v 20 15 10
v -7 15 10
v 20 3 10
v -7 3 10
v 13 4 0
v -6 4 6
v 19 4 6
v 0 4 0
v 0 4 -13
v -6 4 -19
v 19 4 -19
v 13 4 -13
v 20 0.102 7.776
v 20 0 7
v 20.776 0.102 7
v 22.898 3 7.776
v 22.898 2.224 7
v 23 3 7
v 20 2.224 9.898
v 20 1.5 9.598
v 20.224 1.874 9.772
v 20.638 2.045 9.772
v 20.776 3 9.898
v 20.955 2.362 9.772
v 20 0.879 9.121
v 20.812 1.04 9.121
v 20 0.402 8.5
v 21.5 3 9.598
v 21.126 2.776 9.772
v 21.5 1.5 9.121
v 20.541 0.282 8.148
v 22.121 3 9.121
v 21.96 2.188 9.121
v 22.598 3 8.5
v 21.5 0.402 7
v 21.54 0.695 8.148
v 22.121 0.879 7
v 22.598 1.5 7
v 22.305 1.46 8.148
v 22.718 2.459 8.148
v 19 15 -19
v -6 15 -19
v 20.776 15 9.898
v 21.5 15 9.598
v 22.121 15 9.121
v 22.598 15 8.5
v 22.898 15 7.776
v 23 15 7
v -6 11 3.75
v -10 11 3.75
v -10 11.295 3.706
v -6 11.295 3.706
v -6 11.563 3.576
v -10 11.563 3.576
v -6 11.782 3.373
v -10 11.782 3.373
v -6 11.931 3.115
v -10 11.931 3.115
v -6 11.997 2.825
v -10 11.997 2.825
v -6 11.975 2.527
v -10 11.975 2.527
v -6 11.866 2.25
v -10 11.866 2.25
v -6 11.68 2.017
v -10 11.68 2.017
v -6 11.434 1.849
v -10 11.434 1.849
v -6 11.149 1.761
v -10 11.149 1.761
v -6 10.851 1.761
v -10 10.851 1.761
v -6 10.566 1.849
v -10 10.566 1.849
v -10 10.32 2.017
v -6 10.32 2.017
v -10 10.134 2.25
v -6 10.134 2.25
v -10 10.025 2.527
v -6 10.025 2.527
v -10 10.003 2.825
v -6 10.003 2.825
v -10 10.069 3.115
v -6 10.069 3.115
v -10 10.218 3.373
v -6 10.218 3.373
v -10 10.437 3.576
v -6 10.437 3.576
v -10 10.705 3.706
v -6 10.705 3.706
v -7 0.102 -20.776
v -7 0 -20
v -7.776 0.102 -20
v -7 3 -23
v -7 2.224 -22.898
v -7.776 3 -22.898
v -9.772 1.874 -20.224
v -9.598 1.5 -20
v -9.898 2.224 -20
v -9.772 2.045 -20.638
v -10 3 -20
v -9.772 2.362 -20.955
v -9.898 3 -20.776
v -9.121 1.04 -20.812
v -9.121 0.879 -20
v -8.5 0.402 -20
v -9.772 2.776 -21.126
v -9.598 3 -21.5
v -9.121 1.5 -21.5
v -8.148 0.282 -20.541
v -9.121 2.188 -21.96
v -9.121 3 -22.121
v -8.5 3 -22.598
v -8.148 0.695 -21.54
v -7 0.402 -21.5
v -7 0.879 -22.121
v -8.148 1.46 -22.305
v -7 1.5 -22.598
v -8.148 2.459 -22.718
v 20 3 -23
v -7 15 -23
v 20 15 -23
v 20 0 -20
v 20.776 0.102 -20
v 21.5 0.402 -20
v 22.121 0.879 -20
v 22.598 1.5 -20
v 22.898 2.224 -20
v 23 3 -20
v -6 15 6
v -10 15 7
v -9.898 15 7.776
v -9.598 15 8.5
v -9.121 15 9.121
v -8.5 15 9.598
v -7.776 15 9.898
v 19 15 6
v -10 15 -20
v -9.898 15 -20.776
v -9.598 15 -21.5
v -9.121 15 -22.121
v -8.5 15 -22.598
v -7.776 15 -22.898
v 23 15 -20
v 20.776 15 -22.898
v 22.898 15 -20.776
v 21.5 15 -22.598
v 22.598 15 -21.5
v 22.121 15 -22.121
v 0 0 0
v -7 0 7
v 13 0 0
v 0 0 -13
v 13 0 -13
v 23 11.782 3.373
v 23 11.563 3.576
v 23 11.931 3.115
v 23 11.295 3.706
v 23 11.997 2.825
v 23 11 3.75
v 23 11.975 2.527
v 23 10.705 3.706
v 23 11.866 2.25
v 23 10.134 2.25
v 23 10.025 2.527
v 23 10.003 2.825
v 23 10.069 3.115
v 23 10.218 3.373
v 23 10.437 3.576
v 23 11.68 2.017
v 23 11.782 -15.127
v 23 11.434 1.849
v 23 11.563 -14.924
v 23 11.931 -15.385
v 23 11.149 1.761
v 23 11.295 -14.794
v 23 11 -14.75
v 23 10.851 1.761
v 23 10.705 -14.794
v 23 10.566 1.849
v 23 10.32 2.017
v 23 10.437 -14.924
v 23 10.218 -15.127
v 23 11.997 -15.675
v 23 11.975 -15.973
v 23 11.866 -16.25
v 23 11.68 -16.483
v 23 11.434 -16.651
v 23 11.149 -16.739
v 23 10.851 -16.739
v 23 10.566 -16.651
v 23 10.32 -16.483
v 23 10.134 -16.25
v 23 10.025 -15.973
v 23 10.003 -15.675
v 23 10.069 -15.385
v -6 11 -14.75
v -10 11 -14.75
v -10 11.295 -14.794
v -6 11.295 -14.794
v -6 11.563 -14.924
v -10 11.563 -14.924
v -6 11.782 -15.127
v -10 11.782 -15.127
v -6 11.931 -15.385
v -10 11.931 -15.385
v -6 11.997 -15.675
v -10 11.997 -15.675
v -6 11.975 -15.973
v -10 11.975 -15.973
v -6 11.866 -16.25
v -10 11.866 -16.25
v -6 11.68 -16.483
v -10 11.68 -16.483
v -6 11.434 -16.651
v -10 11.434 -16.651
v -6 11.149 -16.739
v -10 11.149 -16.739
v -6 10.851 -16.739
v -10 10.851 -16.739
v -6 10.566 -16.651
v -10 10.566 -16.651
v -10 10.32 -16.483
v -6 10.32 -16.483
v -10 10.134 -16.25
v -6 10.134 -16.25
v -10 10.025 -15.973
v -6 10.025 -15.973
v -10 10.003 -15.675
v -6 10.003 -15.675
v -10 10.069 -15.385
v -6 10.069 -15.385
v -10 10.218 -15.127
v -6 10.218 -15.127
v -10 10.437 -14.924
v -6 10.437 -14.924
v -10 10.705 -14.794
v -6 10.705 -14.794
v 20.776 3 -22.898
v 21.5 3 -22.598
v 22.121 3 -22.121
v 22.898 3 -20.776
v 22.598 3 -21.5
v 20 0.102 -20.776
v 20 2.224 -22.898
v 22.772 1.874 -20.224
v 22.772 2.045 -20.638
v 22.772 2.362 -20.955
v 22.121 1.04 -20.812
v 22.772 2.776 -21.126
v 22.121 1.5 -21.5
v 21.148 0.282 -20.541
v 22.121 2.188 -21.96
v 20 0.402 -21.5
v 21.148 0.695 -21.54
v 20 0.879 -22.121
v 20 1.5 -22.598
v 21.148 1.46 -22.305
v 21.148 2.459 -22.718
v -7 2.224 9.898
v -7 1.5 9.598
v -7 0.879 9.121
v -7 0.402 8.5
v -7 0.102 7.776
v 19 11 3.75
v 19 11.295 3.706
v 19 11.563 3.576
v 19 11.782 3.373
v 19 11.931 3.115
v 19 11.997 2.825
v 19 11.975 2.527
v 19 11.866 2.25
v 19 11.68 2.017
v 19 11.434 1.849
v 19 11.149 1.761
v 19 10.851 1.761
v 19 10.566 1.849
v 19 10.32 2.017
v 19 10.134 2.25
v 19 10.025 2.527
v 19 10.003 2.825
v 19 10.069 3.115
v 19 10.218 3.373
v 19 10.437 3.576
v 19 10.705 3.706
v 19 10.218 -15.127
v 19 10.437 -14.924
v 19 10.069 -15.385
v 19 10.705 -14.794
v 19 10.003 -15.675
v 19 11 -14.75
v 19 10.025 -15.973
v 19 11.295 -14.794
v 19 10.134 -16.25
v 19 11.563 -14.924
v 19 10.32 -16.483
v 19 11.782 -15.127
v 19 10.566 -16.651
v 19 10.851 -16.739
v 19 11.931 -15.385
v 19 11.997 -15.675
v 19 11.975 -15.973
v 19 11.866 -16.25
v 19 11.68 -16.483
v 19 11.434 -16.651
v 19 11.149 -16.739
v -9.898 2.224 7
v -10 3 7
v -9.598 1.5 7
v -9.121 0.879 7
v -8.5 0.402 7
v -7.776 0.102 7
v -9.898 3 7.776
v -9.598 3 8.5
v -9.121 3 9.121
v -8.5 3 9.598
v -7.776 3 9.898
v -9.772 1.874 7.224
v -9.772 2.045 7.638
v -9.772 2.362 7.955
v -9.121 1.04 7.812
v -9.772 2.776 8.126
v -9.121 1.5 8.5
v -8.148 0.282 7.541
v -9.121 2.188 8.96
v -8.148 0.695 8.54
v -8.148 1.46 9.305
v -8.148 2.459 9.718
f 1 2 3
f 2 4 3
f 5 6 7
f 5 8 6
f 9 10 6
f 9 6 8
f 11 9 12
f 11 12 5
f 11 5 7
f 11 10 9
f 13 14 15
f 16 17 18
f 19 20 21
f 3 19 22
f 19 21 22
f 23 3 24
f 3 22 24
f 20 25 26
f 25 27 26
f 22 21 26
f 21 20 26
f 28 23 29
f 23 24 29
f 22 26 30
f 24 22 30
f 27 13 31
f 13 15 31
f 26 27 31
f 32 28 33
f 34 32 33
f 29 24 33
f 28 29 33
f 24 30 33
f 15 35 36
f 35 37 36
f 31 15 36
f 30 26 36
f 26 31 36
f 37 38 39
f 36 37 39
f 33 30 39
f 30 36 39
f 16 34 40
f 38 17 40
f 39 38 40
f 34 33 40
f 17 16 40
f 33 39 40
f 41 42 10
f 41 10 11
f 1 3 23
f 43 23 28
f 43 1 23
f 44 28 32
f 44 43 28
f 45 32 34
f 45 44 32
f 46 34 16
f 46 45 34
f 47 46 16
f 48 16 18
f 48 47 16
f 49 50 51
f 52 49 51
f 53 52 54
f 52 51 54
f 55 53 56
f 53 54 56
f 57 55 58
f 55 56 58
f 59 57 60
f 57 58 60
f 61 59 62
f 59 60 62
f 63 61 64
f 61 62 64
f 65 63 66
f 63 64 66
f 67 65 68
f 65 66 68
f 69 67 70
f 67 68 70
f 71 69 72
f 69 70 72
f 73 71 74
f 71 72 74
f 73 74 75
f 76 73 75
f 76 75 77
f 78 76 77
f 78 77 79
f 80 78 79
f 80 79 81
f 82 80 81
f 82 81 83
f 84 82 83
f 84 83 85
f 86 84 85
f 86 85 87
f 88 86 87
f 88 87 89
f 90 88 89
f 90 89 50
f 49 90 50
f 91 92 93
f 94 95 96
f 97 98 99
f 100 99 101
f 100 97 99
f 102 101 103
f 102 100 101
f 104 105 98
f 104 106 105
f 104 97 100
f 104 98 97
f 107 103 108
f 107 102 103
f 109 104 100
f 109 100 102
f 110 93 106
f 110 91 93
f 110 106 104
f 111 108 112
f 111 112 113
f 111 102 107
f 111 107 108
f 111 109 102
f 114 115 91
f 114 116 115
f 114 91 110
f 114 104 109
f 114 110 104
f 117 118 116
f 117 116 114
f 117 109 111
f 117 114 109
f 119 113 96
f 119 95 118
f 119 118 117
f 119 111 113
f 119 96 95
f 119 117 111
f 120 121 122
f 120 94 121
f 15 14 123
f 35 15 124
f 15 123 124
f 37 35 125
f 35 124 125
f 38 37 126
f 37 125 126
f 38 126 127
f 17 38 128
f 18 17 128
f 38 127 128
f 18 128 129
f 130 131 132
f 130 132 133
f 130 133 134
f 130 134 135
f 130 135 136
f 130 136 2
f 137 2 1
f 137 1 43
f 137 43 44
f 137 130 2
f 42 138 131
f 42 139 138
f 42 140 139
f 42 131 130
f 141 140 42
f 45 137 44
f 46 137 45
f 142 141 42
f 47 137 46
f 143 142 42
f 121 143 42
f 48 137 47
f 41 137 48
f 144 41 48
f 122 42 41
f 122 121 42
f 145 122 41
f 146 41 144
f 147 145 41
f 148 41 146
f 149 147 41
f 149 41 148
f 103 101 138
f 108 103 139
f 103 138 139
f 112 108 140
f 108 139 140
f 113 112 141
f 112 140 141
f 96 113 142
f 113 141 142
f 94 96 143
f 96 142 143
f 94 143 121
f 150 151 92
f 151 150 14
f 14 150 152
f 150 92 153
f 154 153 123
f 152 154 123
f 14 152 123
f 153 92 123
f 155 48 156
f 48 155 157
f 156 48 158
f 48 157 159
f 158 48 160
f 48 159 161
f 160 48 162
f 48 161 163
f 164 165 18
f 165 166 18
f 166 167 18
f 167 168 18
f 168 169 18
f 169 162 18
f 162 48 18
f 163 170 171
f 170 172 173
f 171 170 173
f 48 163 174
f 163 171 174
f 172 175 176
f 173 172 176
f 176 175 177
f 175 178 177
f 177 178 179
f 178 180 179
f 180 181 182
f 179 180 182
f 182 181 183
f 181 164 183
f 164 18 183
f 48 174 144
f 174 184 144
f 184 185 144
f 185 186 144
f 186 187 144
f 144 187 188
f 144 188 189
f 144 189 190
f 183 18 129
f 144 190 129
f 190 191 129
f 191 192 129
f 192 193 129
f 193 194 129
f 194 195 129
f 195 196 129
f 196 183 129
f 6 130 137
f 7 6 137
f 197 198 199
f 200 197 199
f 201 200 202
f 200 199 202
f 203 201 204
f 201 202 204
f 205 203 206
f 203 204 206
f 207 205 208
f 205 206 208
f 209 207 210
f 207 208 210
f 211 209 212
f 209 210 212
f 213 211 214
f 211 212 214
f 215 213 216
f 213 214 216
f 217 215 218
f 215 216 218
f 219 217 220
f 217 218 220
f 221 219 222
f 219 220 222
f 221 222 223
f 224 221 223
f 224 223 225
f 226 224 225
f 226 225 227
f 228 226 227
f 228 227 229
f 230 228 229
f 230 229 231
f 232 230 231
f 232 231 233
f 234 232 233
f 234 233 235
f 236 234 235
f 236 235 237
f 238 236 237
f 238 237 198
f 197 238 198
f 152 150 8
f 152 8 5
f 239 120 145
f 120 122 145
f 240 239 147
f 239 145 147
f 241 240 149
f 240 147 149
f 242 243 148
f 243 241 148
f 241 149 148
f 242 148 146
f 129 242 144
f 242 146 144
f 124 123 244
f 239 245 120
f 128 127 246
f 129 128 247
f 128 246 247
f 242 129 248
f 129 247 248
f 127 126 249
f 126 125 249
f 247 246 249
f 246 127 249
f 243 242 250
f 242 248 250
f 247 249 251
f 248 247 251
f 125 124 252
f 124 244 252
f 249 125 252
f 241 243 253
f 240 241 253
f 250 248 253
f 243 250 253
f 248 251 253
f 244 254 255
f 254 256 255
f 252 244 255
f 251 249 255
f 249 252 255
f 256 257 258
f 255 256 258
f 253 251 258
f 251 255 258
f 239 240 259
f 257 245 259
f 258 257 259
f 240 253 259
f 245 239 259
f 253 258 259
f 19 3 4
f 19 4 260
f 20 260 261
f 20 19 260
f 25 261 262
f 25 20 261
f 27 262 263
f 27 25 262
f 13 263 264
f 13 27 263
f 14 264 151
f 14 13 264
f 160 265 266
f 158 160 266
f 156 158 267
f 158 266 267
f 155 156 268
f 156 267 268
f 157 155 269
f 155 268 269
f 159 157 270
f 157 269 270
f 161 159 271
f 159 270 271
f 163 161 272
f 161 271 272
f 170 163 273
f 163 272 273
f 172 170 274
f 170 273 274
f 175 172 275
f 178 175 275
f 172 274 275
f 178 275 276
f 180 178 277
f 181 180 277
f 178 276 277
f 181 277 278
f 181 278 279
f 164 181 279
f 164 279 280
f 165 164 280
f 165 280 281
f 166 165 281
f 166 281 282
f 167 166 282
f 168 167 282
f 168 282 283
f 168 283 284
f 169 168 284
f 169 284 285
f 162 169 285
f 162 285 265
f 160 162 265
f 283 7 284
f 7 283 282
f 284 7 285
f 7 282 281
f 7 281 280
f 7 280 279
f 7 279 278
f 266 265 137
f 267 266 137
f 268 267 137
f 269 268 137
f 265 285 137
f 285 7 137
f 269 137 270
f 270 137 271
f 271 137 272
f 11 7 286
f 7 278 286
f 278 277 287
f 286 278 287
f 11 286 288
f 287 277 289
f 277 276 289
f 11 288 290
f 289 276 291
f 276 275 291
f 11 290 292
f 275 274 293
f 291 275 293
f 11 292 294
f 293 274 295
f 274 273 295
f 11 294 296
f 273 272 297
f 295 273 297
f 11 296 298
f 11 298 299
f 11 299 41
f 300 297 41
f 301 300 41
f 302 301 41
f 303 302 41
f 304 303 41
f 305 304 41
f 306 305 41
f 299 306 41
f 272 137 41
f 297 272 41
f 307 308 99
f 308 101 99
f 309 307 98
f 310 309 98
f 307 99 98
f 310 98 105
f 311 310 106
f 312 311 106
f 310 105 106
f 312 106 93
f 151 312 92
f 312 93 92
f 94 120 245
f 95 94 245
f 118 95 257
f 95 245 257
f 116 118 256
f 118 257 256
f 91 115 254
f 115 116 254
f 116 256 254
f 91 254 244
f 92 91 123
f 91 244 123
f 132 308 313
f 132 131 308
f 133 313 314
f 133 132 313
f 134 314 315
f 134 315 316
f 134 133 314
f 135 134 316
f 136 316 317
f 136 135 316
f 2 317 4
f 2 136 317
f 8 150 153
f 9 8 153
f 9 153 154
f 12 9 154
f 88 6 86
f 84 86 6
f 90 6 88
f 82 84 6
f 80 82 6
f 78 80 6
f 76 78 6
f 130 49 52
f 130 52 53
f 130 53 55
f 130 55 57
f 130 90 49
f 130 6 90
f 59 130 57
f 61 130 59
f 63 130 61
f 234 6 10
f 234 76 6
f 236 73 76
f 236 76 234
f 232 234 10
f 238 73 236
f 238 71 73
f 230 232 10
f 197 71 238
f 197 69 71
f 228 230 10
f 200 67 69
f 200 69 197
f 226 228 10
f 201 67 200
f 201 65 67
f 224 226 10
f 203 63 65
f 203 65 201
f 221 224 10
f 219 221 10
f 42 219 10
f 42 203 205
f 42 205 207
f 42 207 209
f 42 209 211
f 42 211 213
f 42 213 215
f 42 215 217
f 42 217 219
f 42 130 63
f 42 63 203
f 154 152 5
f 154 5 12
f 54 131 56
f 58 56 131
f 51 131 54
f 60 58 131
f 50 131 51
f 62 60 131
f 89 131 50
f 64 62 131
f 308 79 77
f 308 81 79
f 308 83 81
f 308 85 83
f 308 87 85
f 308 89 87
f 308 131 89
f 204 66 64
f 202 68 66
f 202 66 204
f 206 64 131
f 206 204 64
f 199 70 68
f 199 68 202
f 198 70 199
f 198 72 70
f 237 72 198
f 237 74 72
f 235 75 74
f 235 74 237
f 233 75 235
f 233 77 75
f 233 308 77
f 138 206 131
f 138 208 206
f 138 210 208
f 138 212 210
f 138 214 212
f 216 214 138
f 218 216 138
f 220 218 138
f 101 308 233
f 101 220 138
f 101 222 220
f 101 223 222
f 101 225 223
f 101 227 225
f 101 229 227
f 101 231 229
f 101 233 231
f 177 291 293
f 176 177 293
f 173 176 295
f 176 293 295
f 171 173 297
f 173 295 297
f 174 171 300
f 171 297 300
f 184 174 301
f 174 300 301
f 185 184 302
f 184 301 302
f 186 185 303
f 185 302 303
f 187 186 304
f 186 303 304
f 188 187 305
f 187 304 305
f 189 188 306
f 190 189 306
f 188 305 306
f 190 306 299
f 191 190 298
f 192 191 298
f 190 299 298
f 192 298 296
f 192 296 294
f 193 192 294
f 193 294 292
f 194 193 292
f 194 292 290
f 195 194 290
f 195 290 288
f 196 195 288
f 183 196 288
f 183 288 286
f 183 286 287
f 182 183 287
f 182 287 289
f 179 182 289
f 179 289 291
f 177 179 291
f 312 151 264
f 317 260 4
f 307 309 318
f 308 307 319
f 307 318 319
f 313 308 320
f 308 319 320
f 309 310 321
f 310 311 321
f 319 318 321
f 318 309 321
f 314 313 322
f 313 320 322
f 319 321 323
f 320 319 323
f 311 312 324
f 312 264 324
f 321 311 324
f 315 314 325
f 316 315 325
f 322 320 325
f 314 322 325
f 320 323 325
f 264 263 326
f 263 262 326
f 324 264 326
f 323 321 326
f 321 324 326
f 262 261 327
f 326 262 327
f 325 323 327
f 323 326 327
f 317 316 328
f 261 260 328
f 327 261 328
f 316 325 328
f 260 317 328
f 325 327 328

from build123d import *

# Parameters (mm, degrees)
SKETCH_1_W          = 33
SKETCH_1_H          = 33
SKETCH_1_W_2        = 13
SKETCH_1_H_2        = 13
EXTRUDE_1_DEPTH     = 15
SKETCH_2_W          = 25
SKETCH_2_H          = 25
CUT_EXTRUDE_1_DEPTH = 11
FILLET_3_R          = 3
SKETCH_4_R          = 1
CUT_EXTRUDE_2_DEPTH = 43.930175867


with BuildPart() as part:
    # Эскиз1 → Бобышка-Вытянуть1 (new body)
    with BuildSketch(Plane(origin=(0, 0, 0), x_dir=(1, 0, 0), z_dir=(0, 1, 0))):
        with Locations((6.5, 6.5)):
            Rectangle(SKETCH_1_W, SKETCH_1_H)
        with Locations((6.5, 6.5)):
            Rectangle(SKETCH_1_W_2, SKETCH_1_H_2, mode=Mode.SUBTRACT)
    extrude(amount=EXTRUDE_1_DEPTH)

    # Эскиз2 → Вырез-Вытянуть1 (cut)
    with BuildSketch(Plane(origin=(0, 15, 0), x_dir=(1, 0, 0), z_dir=(0, 1, 0))):
        with Locations((6.5, 6.5)):
            Rectangle(SKETCH_2_W, SKETCH_2_H)
    extrude(amount=-CUT_EXTRUDE_1_DEPTH, mode=Mode.SUBTRACT)

    # Скругление3
    fillet_3_edges = [part.edges().sort_by_distance(p)[0] for p in [
        (6.5, 0, -23),
        (23, 0, -6.5),
        (6.5, 0, 10),
        (-10, 0, -6.5),
        (-10, 7.5, -23),
        (23, 7.5, -23),
        (23, 7.5, 10),
        (-10, 7.5, 10),
    ]]
    fillet(fillet_3_edges, radius=FILLET_3_R)

    # Эскиз4 → Вырез-Вытянуть2 (cut, through all)
    with BuildSketch(Plane.ZY.offset(10)):
        with Locations((2.75, 11)):
            Circle(SKETCH_4_R)
        with Locations((-15.75, 11)):
            Circle(SKETCH_4_R)
    extrude(amount=-CUT_EXTRUDE_2_DEPTH, mode=Mode.SUBTRACT)


solid = part.part
